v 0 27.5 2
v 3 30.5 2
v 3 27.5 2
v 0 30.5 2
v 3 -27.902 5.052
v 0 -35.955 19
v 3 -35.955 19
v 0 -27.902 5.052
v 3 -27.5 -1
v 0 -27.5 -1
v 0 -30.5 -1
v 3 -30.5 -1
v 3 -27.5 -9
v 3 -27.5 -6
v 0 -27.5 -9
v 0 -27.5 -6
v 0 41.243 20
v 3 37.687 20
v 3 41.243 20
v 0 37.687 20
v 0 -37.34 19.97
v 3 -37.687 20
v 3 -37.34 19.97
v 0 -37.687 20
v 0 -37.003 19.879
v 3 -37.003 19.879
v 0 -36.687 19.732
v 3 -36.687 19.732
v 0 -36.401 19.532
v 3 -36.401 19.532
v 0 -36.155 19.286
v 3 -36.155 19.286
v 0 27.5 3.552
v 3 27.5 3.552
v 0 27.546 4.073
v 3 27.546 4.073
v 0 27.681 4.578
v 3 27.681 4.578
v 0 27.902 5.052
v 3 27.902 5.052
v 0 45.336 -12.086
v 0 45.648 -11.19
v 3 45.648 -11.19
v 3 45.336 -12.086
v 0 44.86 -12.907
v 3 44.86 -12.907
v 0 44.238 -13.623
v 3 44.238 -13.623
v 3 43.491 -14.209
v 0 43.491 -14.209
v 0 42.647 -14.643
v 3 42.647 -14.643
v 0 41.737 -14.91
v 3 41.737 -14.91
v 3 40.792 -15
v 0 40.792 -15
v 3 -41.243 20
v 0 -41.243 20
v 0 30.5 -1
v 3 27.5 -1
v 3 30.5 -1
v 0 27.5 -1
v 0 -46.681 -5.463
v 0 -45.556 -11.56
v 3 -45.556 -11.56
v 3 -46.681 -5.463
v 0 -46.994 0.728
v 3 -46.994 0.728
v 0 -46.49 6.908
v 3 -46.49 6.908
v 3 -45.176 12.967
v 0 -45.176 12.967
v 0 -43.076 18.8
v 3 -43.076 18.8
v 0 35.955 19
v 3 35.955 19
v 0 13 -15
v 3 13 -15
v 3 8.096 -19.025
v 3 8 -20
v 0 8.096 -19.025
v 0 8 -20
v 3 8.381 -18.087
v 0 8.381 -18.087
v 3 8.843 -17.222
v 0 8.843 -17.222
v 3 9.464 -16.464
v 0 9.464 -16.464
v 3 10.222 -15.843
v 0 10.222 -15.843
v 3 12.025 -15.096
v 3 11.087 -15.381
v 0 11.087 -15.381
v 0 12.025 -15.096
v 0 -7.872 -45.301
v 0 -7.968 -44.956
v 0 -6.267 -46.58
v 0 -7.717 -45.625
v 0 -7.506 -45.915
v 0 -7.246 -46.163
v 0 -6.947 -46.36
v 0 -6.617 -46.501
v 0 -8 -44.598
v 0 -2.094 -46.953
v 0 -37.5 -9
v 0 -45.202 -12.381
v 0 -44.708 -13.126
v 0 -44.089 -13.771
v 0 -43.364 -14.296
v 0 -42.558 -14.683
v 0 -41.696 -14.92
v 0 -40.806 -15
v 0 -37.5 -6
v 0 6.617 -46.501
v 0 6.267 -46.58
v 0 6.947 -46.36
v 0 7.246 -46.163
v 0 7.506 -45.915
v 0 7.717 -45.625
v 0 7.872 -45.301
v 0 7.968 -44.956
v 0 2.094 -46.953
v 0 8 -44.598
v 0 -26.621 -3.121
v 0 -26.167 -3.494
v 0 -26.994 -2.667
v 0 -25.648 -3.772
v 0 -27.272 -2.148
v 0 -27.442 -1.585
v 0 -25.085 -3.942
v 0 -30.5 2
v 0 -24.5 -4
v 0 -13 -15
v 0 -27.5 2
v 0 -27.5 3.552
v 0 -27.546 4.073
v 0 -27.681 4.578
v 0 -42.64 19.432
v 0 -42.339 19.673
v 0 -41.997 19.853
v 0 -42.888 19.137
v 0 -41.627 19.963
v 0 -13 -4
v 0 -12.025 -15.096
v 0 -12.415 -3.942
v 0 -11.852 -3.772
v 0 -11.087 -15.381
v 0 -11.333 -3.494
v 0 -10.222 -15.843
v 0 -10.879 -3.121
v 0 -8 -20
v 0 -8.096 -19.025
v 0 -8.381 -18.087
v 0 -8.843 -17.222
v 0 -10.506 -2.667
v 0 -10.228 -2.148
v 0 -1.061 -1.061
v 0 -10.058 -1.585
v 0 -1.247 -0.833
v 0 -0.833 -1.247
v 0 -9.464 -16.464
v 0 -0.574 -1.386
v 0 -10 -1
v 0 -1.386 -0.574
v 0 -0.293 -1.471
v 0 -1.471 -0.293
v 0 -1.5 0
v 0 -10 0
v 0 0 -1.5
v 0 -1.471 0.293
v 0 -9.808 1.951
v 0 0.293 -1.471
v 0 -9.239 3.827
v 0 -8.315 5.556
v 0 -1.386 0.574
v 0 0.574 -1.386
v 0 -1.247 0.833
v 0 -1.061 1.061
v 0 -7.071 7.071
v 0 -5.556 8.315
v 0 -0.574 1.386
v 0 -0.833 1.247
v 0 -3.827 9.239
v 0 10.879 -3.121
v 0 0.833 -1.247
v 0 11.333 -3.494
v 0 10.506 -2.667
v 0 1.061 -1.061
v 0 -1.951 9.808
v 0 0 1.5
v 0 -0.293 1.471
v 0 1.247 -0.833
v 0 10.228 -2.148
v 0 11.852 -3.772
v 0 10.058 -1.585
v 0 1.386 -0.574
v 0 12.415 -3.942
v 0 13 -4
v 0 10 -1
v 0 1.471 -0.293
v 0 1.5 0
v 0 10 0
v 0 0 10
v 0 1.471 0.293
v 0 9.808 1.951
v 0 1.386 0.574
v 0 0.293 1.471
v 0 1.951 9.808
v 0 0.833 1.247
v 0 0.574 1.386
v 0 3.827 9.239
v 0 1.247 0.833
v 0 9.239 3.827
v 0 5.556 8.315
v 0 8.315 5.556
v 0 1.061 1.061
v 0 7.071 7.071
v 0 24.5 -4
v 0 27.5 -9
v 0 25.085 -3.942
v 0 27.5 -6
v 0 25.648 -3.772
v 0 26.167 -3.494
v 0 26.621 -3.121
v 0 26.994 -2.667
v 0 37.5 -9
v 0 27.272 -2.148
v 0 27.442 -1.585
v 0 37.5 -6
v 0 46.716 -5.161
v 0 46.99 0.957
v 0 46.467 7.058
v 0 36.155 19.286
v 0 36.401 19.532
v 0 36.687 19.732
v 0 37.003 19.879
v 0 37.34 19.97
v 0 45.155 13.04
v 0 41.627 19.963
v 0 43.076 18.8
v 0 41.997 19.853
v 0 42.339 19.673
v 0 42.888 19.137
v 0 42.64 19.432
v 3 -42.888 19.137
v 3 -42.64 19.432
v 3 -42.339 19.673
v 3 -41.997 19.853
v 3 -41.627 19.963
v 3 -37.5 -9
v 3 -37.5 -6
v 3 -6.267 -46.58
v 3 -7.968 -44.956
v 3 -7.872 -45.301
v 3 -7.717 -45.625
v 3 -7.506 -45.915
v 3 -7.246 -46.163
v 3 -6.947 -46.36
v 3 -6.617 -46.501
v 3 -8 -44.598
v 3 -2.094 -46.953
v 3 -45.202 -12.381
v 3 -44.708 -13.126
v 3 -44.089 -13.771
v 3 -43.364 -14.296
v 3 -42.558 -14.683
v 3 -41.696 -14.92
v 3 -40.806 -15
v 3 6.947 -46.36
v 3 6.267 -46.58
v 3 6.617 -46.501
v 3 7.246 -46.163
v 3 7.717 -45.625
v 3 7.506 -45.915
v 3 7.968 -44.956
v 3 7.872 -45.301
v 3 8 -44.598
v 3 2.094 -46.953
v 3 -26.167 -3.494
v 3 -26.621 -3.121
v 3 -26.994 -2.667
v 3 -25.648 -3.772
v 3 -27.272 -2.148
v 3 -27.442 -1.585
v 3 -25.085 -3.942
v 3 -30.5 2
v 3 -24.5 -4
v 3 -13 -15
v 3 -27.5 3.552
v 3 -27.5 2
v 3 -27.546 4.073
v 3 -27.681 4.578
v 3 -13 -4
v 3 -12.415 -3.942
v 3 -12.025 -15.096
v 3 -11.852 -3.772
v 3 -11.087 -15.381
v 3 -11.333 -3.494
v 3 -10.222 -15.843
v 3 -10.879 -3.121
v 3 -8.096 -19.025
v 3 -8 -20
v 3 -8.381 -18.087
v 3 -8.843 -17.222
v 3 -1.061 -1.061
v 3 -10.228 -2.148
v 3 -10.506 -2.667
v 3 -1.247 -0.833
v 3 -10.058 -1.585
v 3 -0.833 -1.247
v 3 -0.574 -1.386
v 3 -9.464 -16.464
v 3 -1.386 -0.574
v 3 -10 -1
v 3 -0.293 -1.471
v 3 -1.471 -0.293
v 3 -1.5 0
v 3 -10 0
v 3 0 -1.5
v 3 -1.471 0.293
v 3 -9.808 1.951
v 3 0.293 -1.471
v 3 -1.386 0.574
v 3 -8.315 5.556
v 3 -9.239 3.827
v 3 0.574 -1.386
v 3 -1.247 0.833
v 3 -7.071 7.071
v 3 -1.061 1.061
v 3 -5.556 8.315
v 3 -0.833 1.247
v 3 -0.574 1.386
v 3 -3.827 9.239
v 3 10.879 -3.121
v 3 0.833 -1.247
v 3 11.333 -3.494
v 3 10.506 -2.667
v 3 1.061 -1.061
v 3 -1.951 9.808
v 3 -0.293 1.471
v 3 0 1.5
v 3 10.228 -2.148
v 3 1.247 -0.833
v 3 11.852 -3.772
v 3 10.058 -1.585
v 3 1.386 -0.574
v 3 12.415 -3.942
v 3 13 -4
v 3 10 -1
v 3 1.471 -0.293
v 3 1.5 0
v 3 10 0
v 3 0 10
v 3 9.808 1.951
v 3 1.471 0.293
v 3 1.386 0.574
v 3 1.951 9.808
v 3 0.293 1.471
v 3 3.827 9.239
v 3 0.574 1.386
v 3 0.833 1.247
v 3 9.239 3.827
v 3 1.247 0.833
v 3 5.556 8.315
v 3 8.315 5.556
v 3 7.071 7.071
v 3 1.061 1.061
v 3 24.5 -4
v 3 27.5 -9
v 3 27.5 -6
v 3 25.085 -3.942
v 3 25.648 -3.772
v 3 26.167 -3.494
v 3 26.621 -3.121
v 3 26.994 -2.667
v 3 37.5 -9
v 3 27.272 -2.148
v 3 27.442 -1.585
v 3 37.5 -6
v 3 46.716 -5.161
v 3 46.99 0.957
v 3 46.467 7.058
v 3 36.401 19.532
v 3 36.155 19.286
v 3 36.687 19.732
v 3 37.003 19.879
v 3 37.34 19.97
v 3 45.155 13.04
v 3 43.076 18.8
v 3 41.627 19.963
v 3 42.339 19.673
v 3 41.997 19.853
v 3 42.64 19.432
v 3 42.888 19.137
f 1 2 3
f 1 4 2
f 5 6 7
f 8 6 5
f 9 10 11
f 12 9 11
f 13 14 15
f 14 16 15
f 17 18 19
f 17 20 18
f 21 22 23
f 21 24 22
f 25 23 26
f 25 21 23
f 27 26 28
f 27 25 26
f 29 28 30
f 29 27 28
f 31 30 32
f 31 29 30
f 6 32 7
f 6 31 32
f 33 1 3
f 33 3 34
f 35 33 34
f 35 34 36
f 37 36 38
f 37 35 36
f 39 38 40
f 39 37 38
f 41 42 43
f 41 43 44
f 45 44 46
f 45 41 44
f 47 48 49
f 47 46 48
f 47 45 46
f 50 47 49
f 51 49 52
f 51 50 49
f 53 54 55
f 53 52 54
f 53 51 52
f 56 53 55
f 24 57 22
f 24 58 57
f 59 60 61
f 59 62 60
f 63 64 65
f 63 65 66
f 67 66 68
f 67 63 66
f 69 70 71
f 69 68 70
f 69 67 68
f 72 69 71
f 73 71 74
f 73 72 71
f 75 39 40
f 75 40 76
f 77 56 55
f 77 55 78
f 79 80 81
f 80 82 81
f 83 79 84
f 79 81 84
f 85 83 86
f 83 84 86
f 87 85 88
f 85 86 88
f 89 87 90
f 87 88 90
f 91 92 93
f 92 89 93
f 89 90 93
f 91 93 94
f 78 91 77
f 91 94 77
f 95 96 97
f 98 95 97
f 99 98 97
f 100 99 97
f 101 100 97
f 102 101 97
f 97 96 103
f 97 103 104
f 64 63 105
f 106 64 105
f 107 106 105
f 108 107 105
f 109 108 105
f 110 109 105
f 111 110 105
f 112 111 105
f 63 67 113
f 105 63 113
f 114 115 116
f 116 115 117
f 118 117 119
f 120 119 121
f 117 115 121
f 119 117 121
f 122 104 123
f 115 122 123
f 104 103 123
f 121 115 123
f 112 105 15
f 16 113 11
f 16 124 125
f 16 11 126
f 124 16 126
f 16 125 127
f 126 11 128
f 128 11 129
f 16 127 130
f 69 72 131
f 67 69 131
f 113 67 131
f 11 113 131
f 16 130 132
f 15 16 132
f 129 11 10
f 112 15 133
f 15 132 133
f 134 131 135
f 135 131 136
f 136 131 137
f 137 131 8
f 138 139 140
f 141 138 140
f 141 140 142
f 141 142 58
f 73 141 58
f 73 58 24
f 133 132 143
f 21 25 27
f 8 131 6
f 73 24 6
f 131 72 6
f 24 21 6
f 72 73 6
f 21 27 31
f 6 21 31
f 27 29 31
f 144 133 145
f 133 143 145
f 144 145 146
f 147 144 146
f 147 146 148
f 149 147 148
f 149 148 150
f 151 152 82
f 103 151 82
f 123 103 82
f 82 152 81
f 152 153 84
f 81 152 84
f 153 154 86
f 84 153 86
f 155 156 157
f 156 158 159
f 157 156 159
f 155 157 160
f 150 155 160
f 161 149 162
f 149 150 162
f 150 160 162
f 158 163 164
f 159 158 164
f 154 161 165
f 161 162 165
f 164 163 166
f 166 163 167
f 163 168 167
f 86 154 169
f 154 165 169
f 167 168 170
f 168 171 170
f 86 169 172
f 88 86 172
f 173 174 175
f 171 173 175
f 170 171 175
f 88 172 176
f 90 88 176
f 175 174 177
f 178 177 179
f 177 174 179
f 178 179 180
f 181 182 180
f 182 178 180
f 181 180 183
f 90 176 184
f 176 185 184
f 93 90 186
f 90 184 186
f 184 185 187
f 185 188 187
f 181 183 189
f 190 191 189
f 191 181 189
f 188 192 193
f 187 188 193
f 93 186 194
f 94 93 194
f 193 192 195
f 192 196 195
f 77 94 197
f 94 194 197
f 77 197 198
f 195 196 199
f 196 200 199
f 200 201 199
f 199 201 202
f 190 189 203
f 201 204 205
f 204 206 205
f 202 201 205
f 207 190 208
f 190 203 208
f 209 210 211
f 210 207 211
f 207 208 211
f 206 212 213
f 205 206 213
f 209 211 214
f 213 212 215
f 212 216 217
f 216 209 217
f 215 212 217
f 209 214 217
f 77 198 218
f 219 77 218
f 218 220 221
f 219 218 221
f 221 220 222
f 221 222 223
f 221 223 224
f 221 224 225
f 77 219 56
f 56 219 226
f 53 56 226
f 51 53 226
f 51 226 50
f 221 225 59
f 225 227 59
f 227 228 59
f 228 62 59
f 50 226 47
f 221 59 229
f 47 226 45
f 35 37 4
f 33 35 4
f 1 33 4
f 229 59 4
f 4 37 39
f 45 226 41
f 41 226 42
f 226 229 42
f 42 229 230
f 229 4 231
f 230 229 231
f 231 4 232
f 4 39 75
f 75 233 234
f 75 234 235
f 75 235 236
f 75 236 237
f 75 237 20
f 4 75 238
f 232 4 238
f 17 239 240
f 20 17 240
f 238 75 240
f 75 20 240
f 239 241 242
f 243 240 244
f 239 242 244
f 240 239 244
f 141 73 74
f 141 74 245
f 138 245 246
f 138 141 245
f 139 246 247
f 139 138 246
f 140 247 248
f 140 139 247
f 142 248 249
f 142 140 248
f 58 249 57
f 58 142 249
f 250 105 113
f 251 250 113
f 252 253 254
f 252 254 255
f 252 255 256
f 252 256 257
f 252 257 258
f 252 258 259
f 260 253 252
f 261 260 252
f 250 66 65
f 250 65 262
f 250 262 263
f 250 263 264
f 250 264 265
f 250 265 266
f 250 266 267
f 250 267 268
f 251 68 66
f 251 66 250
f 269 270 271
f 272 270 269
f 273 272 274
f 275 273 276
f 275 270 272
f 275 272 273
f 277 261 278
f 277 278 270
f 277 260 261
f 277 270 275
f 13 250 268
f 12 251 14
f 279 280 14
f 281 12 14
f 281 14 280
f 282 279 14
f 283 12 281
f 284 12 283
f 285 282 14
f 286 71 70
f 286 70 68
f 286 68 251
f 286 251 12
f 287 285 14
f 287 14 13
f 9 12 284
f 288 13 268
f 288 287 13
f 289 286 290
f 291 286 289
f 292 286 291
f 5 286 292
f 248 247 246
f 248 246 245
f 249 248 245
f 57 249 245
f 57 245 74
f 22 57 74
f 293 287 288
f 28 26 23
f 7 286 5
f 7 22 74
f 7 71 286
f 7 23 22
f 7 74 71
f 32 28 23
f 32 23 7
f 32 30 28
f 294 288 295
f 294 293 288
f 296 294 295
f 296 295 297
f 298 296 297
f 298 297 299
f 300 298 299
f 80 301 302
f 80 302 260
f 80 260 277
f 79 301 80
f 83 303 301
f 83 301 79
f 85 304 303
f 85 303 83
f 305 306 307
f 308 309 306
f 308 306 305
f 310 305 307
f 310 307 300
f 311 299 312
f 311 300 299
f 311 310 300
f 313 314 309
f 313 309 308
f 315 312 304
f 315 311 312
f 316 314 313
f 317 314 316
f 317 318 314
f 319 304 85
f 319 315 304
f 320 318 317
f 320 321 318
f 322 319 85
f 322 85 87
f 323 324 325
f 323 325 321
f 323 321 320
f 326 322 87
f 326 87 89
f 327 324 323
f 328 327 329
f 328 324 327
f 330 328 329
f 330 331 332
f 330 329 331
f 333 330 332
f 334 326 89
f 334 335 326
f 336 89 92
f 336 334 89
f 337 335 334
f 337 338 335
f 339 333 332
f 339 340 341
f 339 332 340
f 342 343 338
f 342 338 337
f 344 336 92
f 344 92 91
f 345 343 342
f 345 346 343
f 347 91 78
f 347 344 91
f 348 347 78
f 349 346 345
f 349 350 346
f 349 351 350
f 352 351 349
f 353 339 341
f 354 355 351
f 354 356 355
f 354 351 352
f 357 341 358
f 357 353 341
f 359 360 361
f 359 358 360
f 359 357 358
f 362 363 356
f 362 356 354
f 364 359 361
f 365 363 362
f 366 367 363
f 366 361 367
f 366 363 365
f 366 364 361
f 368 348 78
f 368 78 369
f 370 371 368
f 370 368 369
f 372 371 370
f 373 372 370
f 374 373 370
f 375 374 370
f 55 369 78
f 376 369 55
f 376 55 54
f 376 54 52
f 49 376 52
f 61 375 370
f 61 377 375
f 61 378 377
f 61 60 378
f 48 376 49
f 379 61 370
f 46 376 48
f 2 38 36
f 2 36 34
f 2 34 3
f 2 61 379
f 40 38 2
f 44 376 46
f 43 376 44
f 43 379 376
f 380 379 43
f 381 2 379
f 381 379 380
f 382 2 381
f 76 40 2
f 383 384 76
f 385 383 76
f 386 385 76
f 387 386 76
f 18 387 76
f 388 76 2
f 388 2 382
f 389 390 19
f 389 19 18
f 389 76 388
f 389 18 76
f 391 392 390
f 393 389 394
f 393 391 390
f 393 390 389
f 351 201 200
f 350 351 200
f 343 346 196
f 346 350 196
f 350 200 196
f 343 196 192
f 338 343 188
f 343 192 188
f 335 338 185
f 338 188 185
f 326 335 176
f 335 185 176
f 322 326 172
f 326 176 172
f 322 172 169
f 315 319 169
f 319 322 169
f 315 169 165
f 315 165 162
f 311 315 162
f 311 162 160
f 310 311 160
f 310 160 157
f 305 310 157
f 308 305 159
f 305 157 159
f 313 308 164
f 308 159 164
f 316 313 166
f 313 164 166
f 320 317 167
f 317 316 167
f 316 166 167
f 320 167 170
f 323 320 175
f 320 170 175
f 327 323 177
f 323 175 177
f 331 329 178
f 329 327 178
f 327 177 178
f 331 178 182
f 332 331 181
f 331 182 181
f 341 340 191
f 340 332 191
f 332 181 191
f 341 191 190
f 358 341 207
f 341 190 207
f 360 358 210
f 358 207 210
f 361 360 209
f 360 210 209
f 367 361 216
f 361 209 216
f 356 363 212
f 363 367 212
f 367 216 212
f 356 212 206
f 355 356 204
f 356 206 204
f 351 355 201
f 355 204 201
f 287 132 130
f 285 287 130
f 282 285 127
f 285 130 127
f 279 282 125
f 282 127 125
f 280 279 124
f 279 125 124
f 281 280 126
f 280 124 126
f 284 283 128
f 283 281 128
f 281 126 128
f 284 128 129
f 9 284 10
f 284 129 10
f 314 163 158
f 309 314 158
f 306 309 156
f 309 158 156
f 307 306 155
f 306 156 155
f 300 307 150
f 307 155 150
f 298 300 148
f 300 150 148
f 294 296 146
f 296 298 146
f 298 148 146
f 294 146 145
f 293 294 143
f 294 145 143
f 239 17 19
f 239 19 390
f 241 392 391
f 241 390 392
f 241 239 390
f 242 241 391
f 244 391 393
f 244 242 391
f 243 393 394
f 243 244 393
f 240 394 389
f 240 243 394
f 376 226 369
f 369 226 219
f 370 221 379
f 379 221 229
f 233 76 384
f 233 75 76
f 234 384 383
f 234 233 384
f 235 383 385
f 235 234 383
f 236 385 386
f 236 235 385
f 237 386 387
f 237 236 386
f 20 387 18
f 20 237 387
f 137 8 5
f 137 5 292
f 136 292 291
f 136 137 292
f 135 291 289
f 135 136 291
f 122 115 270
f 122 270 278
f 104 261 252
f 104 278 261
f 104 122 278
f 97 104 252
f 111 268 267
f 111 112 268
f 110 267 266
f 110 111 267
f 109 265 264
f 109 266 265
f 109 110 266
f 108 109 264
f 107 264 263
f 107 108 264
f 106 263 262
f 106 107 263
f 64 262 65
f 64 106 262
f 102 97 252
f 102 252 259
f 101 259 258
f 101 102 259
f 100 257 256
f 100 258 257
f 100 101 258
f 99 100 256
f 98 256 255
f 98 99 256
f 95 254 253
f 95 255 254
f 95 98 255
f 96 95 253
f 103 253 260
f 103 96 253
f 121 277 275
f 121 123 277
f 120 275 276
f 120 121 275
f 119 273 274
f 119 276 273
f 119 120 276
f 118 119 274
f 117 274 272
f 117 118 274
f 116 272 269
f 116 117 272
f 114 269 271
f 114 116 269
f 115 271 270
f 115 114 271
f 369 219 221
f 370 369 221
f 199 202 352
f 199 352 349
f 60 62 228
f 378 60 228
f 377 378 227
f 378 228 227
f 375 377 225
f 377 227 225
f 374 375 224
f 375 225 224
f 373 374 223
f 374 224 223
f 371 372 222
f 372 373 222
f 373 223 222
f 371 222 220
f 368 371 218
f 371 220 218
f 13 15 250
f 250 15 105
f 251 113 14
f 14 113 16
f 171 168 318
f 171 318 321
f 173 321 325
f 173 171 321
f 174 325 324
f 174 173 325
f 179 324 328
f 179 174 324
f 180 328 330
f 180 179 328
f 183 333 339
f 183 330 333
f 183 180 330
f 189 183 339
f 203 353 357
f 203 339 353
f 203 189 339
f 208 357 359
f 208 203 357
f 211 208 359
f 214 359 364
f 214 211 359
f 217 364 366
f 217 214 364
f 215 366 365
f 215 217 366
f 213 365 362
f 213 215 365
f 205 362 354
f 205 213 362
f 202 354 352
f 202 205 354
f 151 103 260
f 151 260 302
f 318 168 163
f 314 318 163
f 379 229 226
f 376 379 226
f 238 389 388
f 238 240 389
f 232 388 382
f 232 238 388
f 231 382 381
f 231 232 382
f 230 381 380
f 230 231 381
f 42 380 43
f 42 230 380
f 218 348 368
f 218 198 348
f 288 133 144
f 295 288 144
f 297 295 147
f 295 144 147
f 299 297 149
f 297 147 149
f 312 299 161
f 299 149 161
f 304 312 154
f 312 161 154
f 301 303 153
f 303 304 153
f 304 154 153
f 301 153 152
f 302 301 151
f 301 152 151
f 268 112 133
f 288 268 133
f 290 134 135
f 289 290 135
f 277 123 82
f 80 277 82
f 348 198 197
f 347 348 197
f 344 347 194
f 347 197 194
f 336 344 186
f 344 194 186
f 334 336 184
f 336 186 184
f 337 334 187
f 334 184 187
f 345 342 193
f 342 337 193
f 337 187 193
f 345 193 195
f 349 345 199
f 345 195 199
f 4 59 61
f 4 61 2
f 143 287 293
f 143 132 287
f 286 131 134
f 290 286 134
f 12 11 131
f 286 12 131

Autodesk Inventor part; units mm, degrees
ref_plane "YZ Plane" through (0, 0, 0) normal (1, 0, 0) x (0, 1, 0)
ref_plane "XZ Plane" through (0, 0, 0) normal (0, 1, 0) x (-1, 0, 0)
ref_plane "XY Plane" through (0, 0, 0) normal (0, 0, 1) x (1, 0, 0)
sketch "Sketch1" plane through (0, 0, 0) normal (1, 0, 0) x (0, 1, 0)
  line L0 (-46.6154, -6) -> (46.6154, -6) construction
  line L1 (-37.5, -6) -> (-27.5, -6)
  line L2 (-27.5, -6) -> (-27.5, -9)
  line L3 (-27.5, -9) -> (-37.5, -9)
  line L4 (-37.5, -9) -> (-37.5, -6)
  line L5 (27.5, -6) -> (37.5, -6)
  line L6 (37.5, -6) -> (37.5, -9)
  line L7 (37.5, -9) -> (27.5, -9)
  line L8 (27.5, -9) -> (27.5, -6)
  arc A0 (10, 0) -> (-10, 0) centre (0, 0) ccw
  circle A1 centre (0, 0) radius 1.5
  line L9 (-35.955, 19) -> (-27.9019, 5.0517)
  line L10 (27.9019, 5.0517) -> (35.955, 19)
  line L11 (-8, -44.5982) -> (-8, -20)
  line L12 (8, -44.5982) -> (8, -20)
  arc A2 (-6.2667, -46.5803) -> (6.2667, -46.5803) centre (0, 0) ccw
  line L13 (-25, -39.7995) -> (25, -39.7995) construction
  line L14 (40.7922, -15) -> (13, -15)
  line L15 (-40.8058, -15) -> (-13, -15)
  arc A3 (45.6484, -11.1905) -> (43.0762, 18.8) centre (0, 0) ccw
  line L16 (-46.7846, 0) -> (47, 0) construction
  arc A4 (-45.5561, -11.5602) -> (-40.8058, -15) centre (-40.8058, -10) ccw
  arc A5 (40.7922, -15) -> (45.6484, -11.1905) centre (40.7922, -10) ccw
  arc A6 (-43.0762, 18.8) -> (-45.5561, -11.5602) centre (0, 0) ccw
  line L17 (-41.2432, 20) -> (-37.687, 20)
  line L18 (37.687, 20) -> (41.2432, 20)
  arc A7 (-41.2432, 20) -> (-43.0762, 18.8) centre (-41.2432, 18) ccw
  arc A8 (-35.955, 19) -> (-37.687, 20) centre (-37.687, 18) ccw
  arc A9 (43.0762, 18.8) -> (41.2432, 20) centre (41.2432, 18) ccw
  arc A10 (37.687, 20) -> (35.955, 19) centre (37.687, 18) ccw
  line L19 (-27.5, -1) -> (-30.5, -1)
  line L20 (-30.5, -1) -> (-30.5, 2)
  line L21 (-30.5, 2) -> (-27.5, 2)
  line L22 (27.5, -1) -> (30.5, -1)
  line L23 (30.5, -1) -> (30.5, 2)
  line L24 (30.5, 2) -> (27.5, 2)
  arc A11 (-8, -44.5982) -> (-6.2667, -46.5803) centre (-6, -44.5982) ccw
  arc A12 (6.2667, -46.5803) -> (8, -44.5982) centre (6, -44.5982) ccw
  line L25 (-27.5, 2) -> (-27.5, 3.5517)
  line L26 (27.5, 2) -> (27.5, 3.5517)
  line L27 (-27.5, -1) -> (-27.5, -1)
  line L28 (27.5, -1) -> (27.5, -1)
  line L29 (-10, 0) -> (-10, -1)
  line L30 (10, 0) -> (10, -1)
  line L31 (-24.5, -4) -> (-13, -4)
  line L32 (13, -4) -> (24.5, -4)
  arc A13 (-27.5, -1) -> (-24.5, -4) centre (-24.5, -1) ccw
  arc A14 (-27.5, 3.5517) -> (-27.9019, 5.0517) centre (-30.5, 3.5517) ccw
  arc A15 (-13, -4) -> (-10, -1) centre (-13, -1) ccw
  arc A16 (10, -1) -> (13, -4) centre (13, -1) ccw
  arc A17 (24.5, -4) -> (27.5, -1) centre (24.5, -1) ccw
  arc A18 (27.9019, 5.0517) -> (27.5, 3.5517) centre (30.5, 3.5517) ccw
  arc A19 (-8, -20) -> (-13, -15) centre (-13, -20) ccw
  arc A20 (13, -15) -> (8, -20) centre (13, -20) ccw
  point P0 (-42.5323, 20)
  point P1 (42.5323, 20)
  point P2 (-36.5323, 20)
  point P3 (36.5323, 20)
  point P4 (-26.14, 2)
  point P5 (26.14, 2)
  point P6 (-8, -10)
  point P7 (8, -10)
  point P8 (-45.4579, -15)
  point P9 (44.5421, -15)
  point P10 (-25.4579, -10)
  point P11 (8, -15)
  point P12 (-8, -15)
  point P13 (-8, -46.3141)
  point P14 (8, -46.3141)
  dimension "d3" = 10
  dimension "d4" = 3
  dimension "d5" = 10
  dimension "d6" = 3
  dimension "d105" = 50
  dimension "d116" = 6
  dimension "d122" = 8
  dimension "d123" = 8
  dimension "d131" = 47
  dimension "d137" = 5
  dimension "d141" = 6
  dimension "d142" = 120
  dimension "d143" = 6
  dimension "d144" = 120
  dimension "d145" = 2
  dimension "d146" = 3
  dimension "d147" = 3
  dimension "d148" = 5
  dimension "d149" = 3
  dimension "d150" = 3
  dimension "d151" = 5
  dimension "d154" = 47
  dimension "d155" = 10
  dimension "d156" = 2
  dimension "d159" = 20
  dimension "d160" = 20
  dimension "d162" = 3
  dimension "d163" = 15
  dimension "d164" = 15
  dimension "d167" = 30.5
  dimension "d168" = 30.5
  dimension "d169" = 3
  dimension "d170" = 3
  dimension "d171" = 27.5
  dimension "d172" = 27.5
  dimension "d173" = 5
  dimension "d174" = 11
  dimension "d175" = 11
extrude "Extrusion5" add sketch "Sketch1" along normal blind 3
properties part number "Endplate 072313"
